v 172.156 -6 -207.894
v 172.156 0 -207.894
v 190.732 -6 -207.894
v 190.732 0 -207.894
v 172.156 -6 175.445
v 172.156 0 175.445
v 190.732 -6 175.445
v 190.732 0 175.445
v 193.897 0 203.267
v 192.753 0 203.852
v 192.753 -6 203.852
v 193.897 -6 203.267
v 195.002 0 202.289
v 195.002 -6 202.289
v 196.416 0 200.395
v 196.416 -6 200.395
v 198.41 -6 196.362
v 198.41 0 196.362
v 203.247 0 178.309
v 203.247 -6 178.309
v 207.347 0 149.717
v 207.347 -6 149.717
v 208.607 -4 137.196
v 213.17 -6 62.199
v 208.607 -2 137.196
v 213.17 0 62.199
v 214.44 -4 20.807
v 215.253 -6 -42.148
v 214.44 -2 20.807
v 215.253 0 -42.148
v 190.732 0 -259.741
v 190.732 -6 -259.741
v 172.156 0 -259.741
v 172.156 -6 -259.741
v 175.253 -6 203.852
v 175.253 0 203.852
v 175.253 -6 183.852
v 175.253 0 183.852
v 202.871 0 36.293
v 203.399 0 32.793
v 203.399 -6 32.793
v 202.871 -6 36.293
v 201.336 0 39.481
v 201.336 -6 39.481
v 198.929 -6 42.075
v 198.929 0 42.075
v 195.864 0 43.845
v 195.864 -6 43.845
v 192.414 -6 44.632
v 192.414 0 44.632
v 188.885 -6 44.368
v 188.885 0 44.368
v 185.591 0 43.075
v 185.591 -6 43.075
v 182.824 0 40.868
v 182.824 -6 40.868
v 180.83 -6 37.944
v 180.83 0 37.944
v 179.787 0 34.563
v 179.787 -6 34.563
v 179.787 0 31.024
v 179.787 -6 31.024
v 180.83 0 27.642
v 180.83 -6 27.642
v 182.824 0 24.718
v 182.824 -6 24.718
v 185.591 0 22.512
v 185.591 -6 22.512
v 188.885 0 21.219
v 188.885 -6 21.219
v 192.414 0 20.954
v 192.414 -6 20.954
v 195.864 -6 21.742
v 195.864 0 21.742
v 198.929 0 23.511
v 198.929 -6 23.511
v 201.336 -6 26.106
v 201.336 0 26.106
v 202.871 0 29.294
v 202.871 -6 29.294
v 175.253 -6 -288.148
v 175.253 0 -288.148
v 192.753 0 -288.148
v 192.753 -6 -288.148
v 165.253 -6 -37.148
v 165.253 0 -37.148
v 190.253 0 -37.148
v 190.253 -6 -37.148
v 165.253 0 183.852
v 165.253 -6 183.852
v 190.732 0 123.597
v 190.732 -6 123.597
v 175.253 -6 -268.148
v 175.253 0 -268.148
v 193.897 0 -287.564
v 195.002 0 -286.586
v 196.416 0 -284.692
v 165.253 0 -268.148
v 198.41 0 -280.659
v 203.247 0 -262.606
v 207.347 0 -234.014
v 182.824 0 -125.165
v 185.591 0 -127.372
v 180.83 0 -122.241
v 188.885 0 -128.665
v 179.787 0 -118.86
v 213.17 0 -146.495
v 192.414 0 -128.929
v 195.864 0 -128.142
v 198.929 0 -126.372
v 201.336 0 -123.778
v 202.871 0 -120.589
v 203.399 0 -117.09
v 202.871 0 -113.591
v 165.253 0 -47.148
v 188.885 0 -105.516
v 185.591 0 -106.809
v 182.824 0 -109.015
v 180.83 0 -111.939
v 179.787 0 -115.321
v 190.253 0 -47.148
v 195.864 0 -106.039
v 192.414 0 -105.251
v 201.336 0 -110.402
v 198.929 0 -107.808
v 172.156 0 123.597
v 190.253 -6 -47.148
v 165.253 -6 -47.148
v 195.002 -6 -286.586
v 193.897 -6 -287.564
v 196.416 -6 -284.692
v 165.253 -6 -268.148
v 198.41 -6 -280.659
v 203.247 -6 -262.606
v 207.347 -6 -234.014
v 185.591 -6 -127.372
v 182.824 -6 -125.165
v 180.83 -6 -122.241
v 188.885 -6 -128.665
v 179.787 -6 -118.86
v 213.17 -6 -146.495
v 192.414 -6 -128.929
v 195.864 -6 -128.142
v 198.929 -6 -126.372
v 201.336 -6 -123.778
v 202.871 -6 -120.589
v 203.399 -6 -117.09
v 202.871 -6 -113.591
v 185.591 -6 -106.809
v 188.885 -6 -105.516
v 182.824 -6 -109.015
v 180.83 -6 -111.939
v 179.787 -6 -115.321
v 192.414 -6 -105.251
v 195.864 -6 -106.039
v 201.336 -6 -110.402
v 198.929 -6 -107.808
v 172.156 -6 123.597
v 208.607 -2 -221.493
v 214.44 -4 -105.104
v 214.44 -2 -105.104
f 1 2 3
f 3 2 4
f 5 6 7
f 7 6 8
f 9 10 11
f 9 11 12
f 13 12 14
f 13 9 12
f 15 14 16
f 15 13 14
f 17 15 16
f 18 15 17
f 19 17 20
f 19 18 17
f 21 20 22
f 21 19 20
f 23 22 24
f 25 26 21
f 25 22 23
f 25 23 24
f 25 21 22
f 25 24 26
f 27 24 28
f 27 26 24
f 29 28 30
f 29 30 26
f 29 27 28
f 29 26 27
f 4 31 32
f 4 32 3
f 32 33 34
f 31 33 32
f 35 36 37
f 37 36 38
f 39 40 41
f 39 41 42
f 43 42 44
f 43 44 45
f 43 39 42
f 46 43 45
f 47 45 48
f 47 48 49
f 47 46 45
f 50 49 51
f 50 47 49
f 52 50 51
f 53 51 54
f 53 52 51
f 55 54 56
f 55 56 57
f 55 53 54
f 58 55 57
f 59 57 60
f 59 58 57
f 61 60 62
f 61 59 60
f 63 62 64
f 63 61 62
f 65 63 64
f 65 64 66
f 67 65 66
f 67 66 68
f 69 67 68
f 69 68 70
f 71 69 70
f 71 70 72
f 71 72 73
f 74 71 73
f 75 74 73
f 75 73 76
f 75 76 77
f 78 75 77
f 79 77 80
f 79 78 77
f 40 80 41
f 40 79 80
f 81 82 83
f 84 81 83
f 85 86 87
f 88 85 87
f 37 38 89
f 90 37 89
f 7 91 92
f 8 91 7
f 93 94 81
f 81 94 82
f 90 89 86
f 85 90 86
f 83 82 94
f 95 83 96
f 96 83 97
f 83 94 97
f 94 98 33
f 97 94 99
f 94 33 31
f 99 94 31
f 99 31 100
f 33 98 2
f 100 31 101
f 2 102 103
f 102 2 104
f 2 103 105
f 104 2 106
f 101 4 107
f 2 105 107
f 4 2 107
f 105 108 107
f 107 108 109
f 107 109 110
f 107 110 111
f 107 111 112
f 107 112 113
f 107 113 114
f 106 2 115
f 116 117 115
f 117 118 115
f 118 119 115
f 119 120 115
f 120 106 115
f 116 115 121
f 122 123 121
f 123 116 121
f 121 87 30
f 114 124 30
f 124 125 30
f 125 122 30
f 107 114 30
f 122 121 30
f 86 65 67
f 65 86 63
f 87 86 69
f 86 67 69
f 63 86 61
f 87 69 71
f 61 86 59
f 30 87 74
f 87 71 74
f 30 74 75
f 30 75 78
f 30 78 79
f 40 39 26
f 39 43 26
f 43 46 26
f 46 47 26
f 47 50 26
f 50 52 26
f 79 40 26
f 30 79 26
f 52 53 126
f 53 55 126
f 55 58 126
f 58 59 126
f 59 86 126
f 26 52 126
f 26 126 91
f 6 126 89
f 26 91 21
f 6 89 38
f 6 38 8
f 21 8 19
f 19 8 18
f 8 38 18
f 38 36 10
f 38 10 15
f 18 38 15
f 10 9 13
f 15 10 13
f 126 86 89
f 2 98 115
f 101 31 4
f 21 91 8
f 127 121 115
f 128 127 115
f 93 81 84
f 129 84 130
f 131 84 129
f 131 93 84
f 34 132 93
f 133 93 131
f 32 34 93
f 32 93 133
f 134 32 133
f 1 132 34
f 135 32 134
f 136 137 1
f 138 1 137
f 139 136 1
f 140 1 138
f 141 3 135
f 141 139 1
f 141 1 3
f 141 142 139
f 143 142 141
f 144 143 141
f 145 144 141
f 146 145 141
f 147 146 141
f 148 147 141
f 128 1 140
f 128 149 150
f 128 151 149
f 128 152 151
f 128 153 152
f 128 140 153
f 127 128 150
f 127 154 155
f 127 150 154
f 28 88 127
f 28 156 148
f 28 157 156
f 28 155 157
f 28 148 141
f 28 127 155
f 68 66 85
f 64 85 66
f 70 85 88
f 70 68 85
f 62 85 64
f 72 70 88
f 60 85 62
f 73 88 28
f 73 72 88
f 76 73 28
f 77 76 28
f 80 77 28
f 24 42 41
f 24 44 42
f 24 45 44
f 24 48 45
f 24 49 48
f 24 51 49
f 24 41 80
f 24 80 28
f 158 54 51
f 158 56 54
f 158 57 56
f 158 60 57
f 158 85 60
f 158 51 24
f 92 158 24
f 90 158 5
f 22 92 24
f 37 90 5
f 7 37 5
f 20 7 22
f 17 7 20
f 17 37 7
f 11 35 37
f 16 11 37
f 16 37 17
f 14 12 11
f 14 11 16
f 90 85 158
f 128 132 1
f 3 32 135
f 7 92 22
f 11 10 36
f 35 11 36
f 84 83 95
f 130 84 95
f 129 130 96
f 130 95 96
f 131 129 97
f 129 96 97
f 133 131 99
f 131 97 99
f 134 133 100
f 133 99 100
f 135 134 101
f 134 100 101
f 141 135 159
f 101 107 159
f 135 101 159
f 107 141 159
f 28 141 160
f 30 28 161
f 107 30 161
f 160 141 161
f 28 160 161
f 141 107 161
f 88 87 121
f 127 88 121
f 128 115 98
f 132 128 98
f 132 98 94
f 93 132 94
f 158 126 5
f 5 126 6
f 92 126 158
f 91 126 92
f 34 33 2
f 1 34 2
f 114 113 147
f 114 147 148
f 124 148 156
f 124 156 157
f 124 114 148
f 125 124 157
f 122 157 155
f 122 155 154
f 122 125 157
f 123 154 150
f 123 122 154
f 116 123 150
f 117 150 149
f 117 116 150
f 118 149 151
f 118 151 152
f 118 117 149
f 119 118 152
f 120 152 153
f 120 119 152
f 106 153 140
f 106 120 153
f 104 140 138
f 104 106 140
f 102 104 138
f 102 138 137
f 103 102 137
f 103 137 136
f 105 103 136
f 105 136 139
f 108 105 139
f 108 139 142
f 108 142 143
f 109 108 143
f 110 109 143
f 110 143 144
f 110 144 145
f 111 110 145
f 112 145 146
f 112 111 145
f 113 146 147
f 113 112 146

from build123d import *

# Parameters (mm, degrees)
F0_W     = 18.5761749744
F0_H     = 51.8475696445
F0_R     = 11.8720680475
F1_DEPTH = 6


# Not quite as in the source:
# - ends of sketch curves that miss each other by under 0.0002 mm in the source are joined
# - a feature names something its author has since deleted; it is built from what else it names


with BuildPart() as f1:
    # F0 (on Front) → F1 (new body)
    with BuildSketch(Plane.XZ):
        with BuildLine():
            add(Edge.make_bspline(
                [(192.7526748574, -288.1484243559), (215.2837565712, -280.7484243098), (215.2837563696, -43.999011342), (215.2526721504, -42.1484243381)],
                knots=[0, 0, 0, 0, 247.0268201774, 247.0268201774, 247.0268201774, 247.0268201774], degree=3))
            Line((215.2526721504, -42.1484243381), (190.2526734349, -42.1484243613))
            Line((190.2526734349, -42.1484243613), (190.2526734349, -47.1484243613))
            Line((190.2526734349, -47.1484243613), (165.2526734349, -47.1484243613))
            Line((165.2526734349, -47.1484243613), (165.2526734349, -268.1484243613))
            Line((165.2526734349, -268.1484243613), (175.2526734349, -268.1484243613))
            Line((175.2526734349, -268.1484243613), (175.2526734349, -288.1484243613))
            Line((175.2526734349, -288.1484243613), (192.7526748574, -288.1484243559))
        make_face()
        with Locations((181.4437263322, -233.8176692815)):
            Rectangle(F0_W, F0_H, mode=Mode.SUBTRACT)
        with Locations((191.5265821529, -117.0901346)):
            Circle(F0_R, mode=Mode.SUBTRACT)
        with BuildLine():
            add(Edge.make_bspline(
                [(192.7526744386, 203.8515756413), (215.2837561649, 196.4515756336), (215.2837563665, -40.2978373342), (215.2526721504, -42.1484243381)],
                knots=[0, 0, 0, 0, 247.0268201774, 247.0268201774, 247.0268201774, 247.0268201774], degree=3))
            Line((192.7526744386, 203.8515756413), (175.2526734349, 203.8515756387))
            Line((175.2526734349, 203.8515756387), (175.2526734349, 183.8515756387))
            Line((175.2526734349, 183.8515756387), (165.2526734349, 183.8515756387))
            Line((165.2526734349, 183.8515756387), (165.2526734349, -37.1484243613))
            Line((165.2526734349, -37.1484243613), (190.2526734349, -37.1484243613))
            Line((190.2526734349, -37.1484243613), (190.2526734349, -42.1484243613))
            Line((190.2526734349, -42.1484243613), (215.2526721504, -42.1484243381))
        make_face()
        with Locations((181.4437263322, 149.5208205589)):
            Rectangle(F0_W, F0_H, mode=Mode.SUBTRACT)
        with Locations((191.5265821529, 32.7932858774)):
            Circle(F0_R, mode=Mode.SUBTRACT)
    extrude(amount=F1_DEPTH)


solid = f1.part
